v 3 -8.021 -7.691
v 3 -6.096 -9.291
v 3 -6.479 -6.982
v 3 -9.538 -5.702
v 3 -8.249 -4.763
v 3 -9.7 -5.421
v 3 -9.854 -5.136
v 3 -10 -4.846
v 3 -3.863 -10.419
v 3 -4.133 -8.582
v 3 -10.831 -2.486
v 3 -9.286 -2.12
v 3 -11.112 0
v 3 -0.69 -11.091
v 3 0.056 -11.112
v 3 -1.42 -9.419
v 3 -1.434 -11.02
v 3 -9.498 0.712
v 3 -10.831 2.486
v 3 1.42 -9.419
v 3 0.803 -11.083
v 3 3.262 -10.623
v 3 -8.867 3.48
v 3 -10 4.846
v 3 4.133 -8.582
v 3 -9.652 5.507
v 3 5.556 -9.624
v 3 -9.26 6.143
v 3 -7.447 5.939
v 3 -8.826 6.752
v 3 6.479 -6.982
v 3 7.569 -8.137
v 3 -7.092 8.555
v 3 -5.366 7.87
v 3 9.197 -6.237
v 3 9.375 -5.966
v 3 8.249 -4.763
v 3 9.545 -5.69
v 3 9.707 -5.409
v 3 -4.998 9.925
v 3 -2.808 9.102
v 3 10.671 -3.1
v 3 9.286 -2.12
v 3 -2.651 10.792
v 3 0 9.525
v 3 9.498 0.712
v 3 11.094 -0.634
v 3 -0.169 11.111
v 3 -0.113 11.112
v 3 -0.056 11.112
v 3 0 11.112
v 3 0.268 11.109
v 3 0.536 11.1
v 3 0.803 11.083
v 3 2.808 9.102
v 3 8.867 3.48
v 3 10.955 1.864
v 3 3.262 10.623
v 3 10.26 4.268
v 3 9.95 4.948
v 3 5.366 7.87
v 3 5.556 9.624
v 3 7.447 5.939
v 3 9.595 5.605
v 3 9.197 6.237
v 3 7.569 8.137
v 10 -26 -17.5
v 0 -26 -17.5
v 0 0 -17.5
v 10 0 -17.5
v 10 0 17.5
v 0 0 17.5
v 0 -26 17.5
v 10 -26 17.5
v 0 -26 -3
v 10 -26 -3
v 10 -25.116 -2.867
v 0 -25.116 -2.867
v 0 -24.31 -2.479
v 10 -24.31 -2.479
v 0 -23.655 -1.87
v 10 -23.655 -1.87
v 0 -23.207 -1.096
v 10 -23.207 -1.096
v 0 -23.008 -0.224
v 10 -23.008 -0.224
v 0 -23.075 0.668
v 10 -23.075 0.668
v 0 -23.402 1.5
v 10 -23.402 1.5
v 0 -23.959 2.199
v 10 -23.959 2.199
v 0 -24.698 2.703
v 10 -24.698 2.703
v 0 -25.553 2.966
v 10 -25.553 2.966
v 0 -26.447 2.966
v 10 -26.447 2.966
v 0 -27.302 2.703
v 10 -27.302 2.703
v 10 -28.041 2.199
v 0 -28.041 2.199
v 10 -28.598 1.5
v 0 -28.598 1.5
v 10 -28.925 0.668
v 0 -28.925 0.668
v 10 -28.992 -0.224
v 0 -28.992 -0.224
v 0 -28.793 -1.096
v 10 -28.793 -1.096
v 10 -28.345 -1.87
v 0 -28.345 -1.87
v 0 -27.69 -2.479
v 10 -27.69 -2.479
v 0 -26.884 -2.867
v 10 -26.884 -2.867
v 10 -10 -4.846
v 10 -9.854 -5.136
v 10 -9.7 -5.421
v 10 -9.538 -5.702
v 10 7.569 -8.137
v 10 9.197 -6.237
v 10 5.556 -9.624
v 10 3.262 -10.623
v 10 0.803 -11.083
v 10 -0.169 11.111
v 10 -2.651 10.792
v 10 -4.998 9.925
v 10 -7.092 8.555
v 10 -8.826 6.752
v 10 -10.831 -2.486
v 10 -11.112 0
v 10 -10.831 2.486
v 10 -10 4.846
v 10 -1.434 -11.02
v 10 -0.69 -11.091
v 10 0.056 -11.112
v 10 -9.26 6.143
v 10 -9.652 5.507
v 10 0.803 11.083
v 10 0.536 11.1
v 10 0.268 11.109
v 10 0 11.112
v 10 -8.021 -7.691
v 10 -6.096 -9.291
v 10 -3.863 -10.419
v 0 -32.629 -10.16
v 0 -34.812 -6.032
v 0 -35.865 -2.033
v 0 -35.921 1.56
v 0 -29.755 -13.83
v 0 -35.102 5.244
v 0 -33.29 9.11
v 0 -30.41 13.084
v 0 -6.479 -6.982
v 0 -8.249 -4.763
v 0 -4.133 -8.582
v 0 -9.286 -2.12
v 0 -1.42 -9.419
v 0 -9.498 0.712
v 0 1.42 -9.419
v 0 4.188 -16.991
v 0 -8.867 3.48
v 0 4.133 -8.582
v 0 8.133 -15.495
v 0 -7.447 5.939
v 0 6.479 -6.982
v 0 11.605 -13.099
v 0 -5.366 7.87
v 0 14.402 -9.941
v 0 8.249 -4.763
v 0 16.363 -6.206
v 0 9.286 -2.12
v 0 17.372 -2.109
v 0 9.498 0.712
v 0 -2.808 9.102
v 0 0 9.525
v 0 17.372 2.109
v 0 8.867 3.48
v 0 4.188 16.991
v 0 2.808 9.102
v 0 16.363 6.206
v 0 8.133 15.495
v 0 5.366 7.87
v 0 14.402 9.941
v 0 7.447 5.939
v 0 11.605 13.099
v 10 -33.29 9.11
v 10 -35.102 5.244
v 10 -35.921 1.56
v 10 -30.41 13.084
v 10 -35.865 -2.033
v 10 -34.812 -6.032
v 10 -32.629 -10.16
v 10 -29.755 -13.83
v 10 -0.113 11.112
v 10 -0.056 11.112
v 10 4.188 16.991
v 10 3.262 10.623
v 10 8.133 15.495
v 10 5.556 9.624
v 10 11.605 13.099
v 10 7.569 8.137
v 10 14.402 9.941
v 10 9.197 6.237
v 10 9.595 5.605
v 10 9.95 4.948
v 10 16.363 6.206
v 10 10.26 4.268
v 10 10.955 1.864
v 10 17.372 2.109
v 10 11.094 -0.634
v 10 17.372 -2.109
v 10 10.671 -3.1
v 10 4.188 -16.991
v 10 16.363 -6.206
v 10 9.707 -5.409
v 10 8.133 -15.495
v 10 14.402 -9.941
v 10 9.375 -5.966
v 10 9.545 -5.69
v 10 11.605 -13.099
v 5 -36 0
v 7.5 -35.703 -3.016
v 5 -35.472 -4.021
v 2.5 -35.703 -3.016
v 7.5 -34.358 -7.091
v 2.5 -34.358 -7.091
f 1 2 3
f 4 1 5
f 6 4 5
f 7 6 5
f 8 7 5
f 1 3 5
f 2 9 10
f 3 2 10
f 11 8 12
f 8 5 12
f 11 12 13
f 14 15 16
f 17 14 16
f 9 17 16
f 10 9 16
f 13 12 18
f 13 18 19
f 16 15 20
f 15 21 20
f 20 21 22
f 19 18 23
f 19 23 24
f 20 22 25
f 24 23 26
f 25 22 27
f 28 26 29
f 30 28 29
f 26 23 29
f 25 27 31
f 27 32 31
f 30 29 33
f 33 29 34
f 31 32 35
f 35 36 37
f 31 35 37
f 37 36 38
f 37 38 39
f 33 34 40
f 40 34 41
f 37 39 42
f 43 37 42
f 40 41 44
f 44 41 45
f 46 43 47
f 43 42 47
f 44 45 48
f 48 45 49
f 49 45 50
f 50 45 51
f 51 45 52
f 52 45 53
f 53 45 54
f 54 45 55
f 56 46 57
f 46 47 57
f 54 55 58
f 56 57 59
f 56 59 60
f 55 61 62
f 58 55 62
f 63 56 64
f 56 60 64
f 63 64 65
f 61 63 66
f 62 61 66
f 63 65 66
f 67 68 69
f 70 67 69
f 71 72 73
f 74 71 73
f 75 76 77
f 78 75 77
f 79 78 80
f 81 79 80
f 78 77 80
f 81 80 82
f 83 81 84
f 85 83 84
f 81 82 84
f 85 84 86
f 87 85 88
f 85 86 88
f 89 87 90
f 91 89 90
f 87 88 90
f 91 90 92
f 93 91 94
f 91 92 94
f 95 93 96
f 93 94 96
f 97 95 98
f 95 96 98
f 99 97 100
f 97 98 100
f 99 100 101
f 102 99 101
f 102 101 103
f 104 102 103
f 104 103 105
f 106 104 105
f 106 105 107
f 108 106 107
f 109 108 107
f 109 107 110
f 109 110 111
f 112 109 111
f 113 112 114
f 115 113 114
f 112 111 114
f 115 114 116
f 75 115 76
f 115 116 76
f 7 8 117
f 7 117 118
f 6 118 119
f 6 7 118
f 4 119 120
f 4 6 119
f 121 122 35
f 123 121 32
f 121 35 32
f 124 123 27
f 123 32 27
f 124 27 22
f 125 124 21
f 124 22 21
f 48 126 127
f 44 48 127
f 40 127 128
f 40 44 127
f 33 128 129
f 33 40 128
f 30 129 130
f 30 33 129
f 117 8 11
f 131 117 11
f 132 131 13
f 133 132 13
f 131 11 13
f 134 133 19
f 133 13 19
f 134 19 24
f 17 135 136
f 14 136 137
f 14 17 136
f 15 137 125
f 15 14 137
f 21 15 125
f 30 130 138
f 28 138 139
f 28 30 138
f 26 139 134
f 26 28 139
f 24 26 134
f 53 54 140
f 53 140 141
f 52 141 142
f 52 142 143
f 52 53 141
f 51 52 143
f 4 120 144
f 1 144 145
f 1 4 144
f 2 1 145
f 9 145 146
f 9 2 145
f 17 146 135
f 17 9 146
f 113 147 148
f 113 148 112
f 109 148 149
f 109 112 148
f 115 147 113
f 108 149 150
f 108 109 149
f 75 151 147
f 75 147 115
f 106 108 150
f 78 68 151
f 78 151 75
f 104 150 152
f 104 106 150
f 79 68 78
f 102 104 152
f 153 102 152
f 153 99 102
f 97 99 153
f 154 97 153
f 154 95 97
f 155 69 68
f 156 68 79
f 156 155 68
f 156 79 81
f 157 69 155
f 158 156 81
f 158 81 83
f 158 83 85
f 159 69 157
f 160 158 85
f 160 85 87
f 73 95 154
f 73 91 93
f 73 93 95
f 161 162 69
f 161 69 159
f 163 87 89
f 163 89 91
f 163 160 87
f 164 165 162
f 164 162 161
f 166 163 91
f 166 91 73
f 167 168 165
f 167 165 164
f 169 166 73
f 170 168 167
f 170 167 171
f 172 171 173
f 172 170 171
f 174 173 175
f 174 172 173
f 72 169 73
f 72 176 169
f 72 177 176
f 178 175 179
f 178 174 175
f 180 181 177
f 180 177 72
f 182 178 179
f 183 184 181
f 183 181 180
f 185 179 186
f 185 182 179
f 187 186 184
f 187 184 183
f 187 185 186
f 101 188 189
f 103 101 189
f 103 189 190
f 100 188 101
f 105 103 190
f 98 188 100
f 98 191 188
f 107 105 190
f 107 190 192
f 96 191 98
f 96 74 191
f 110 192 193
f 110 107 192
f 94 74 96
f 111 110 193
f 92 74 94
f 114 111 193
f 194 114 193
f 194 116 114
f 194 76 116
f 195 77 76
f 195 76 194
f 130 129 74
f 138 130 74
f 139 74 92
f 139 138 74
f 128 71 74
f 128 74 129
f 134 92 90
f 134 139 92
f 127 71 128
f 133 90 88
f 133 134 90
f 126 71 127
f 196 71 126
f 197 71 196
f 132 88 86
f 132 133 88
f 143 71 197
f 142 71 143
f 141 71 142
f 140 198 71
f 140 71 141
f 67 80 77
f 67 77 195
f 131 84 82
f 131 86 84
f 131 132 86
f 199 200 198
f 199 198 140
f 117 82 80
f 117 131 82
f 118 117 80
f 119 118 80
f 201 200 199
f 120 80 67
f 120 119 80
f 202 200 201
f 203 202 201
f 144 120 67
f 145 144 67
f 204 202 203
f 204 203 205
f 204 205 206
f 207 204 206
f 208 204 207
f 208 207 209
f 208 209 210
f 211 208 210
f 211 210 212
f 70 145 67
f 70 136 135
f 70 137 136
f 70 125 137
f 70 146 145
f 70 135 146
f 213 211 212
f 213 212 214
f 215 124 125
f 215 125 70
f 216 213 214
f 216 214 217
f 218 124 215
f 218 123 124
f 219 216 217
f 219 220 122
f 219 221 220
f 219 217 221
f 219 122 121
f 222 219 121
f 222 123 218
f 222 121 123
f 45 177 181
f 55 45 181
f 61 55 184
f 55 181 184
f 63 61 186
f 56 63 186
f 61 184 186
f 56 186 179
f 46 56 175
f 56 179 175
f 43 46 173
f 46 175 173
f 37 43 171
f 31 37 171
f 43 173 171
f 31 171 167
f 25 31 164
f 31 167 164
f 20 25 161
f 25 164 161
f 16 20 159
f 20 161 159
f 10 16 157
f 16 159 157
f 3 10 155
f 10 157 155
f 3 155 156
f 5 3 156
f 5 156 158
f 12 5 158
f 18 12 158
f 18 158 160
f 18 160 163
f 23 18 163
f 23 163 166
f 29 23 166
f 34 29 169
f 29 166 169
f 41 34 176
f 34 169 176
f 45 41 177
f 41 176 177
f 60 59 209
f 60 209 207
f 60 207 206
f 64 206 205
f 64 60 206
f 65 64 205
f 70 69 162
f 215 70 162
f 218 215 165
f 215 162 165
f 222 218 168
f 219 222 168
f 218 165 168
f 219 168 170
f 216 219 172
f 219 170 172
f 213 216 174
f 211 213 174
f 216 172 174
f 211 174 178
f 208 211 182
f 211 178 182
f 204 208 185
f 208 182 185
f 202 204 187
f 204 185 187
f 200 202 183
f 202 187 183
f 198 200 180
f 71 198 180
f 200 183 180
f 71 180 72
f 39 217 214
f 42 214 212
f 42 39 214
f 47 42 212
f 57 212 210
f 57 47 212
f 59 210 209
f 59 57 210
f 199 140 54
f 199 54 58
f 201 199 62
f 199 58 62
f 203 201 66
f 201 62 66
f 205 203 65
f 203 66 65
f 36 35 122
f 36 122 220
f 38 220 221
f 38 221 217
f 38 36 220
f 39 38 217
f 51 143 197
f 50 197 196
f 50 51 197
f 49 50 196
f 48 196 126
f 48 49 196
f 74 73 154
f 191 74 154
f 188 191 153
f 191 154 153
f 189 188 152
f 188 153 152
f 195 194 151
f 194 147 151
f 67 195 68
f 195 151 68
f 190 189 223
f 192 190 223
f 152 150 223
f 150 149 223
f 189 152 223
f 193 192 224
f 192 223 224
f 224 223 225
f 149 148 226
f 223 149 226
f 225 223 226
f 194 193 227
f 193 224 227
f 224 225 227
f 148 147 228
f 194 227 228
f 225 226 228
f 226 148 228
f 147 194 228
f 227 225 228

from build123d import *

# Parameters (mm, degrees)
CROQUIS1_R              = 2.5
SALIENTE_EXTRUIR2_DEPTH = 10
CROQUIS2_R              = 17.5
CROQUIS2_R_2            = 11.1125
SALIENTE_EXTRUIR3_DEPTH = 10
CROQUIS3_R              = 11.1125
CORTAR_EXTRUIR1_DEPTH   = 10
CROQUIS4_R              = 11.1125
CROQUIS4_R_2            = 9.525
SALIENTE_EXTRUIR4_DEPTH = 3
CROQUIS5_R              = 3
CORTAR_EXTRUIR2_DEPTH   = 10


with BuildPart() as part:
    # Croquis1 → Saliente-Extruir2 (new body)
    with BuildSketch(Plane(origin=(0, 0, 0), x_dir=(0, 0, -1), z_dir=(1, 0, 0))):
        with BuildLine():
            Line((17.5, -26), (17.5, 0))
            ThreePointArc((17.5, 0), (0, 17.5), (-17.5, 0))
            Line((-17.5, 0), (-17.5, -26))
            add(Edge.make_bspline(
                [(-17.5, -26), (0, -46), (17.5, -26)],
                knots=[0, 0, 0, 1, 1, 1], degree=2))
        make_face()
        with Locations((0, -26)):
            Circle(CROQUIS1_R, mode=Mode.SUBTRACT)
        with BuildLine():
            Line((-13.783729421, -3.874119675), (-3.536778655, 13.874119675))
            ThreePointArc((-3.536778655, 13.874119675), (-2.922822403, 14.532391234), (-2.082378285, 14.854753471))
            ThreePointArc((-2.082378285, 14.854753471), (0, 15), (2.082378285, 14.854753471))
            ThreePointArc((2.082378285, 14.854753471), (2.922822403, 14.532391234), (3.536778655, 13.874119675))
            Line((3.536778655, 13.874119675), (13.783729421, -3.874119675))
            ThreePointArc((13.783729421, -3.874119675), (14.046831188, -4.734957166), (13.905783015, -5.62398424))
            ThreePointArc((13.905783015, -5.62398424), (12.990381057, -7.5), (11.82340473, -9.230769231))
            ThreePointArc((11.82340473, -9.230769231), (11.124008785, -9.797434069), (10.246950766, -10))
            Line((10.246950766, -10), (-10.246950766, -10))
            ThreePointArc((-10.246950766, -10), (-11.124008785, -9.797434069), (-11.82340473, -9.230769231))
            ThreePointArc((-11.82340473, -9.230769231), (-12.990381057, -7.5), (-13.905783015, -5.62398424))
            ThreePointArc((-13.905783015, -5.62398424), (-14.046831188, -4.734957166), (-13.783729421, -3.874119675))
        make_face(mode=Mode.SUBTRACT)
    extrude(amount=SALIENTE_EXTRUIR2_DEPTH)

    # Croquis2 → Saliente-Extruir3 (add)
    with BuildSketch(Plane.ZY):
        Circle(CROQUIS2_R)
        Circle(CROQUIS2_R_2, mode=Mode.SUBTRACT)
    extrude(amount=-SALIENTE_EXTRUIR3_DEPTH)

    # Croquis3 → Cortar-Extruir1 (cut)
    with BuildSketch(Plane.ZY):
        Circle(CROQUIS3_R)
    extrude(amount=-CORTAR_EXTRUIR1_DEPTH, mode=Mode.SUBTRACT)

    # Croquis4 → Saliente-Extruir4 (add)
    with BuildSketch(Plane.ZY):
        Circle(CROQUIS4_R)
        Circle(CROQUIS4_R_2, mode=Mode.SUBTRACT)
    extrude(amount=-SALIENTE_EXTRUIR4_DEPTH)

    # Croquis5 → Cortar-Extruir2 (cut)
    with BuildSketch(Plane(origin=(10, 0, 0), x_dir=(0, 0, -1), z_dir=(1, 0, 0))):
        with Locations((0, -26)):
            Circle(CROQUIS5_R)
    extrude(amount=-CORTAR_EXTRUIR2_DEPTH, mode=Mode.SUBTRACT)


solid = part.part
